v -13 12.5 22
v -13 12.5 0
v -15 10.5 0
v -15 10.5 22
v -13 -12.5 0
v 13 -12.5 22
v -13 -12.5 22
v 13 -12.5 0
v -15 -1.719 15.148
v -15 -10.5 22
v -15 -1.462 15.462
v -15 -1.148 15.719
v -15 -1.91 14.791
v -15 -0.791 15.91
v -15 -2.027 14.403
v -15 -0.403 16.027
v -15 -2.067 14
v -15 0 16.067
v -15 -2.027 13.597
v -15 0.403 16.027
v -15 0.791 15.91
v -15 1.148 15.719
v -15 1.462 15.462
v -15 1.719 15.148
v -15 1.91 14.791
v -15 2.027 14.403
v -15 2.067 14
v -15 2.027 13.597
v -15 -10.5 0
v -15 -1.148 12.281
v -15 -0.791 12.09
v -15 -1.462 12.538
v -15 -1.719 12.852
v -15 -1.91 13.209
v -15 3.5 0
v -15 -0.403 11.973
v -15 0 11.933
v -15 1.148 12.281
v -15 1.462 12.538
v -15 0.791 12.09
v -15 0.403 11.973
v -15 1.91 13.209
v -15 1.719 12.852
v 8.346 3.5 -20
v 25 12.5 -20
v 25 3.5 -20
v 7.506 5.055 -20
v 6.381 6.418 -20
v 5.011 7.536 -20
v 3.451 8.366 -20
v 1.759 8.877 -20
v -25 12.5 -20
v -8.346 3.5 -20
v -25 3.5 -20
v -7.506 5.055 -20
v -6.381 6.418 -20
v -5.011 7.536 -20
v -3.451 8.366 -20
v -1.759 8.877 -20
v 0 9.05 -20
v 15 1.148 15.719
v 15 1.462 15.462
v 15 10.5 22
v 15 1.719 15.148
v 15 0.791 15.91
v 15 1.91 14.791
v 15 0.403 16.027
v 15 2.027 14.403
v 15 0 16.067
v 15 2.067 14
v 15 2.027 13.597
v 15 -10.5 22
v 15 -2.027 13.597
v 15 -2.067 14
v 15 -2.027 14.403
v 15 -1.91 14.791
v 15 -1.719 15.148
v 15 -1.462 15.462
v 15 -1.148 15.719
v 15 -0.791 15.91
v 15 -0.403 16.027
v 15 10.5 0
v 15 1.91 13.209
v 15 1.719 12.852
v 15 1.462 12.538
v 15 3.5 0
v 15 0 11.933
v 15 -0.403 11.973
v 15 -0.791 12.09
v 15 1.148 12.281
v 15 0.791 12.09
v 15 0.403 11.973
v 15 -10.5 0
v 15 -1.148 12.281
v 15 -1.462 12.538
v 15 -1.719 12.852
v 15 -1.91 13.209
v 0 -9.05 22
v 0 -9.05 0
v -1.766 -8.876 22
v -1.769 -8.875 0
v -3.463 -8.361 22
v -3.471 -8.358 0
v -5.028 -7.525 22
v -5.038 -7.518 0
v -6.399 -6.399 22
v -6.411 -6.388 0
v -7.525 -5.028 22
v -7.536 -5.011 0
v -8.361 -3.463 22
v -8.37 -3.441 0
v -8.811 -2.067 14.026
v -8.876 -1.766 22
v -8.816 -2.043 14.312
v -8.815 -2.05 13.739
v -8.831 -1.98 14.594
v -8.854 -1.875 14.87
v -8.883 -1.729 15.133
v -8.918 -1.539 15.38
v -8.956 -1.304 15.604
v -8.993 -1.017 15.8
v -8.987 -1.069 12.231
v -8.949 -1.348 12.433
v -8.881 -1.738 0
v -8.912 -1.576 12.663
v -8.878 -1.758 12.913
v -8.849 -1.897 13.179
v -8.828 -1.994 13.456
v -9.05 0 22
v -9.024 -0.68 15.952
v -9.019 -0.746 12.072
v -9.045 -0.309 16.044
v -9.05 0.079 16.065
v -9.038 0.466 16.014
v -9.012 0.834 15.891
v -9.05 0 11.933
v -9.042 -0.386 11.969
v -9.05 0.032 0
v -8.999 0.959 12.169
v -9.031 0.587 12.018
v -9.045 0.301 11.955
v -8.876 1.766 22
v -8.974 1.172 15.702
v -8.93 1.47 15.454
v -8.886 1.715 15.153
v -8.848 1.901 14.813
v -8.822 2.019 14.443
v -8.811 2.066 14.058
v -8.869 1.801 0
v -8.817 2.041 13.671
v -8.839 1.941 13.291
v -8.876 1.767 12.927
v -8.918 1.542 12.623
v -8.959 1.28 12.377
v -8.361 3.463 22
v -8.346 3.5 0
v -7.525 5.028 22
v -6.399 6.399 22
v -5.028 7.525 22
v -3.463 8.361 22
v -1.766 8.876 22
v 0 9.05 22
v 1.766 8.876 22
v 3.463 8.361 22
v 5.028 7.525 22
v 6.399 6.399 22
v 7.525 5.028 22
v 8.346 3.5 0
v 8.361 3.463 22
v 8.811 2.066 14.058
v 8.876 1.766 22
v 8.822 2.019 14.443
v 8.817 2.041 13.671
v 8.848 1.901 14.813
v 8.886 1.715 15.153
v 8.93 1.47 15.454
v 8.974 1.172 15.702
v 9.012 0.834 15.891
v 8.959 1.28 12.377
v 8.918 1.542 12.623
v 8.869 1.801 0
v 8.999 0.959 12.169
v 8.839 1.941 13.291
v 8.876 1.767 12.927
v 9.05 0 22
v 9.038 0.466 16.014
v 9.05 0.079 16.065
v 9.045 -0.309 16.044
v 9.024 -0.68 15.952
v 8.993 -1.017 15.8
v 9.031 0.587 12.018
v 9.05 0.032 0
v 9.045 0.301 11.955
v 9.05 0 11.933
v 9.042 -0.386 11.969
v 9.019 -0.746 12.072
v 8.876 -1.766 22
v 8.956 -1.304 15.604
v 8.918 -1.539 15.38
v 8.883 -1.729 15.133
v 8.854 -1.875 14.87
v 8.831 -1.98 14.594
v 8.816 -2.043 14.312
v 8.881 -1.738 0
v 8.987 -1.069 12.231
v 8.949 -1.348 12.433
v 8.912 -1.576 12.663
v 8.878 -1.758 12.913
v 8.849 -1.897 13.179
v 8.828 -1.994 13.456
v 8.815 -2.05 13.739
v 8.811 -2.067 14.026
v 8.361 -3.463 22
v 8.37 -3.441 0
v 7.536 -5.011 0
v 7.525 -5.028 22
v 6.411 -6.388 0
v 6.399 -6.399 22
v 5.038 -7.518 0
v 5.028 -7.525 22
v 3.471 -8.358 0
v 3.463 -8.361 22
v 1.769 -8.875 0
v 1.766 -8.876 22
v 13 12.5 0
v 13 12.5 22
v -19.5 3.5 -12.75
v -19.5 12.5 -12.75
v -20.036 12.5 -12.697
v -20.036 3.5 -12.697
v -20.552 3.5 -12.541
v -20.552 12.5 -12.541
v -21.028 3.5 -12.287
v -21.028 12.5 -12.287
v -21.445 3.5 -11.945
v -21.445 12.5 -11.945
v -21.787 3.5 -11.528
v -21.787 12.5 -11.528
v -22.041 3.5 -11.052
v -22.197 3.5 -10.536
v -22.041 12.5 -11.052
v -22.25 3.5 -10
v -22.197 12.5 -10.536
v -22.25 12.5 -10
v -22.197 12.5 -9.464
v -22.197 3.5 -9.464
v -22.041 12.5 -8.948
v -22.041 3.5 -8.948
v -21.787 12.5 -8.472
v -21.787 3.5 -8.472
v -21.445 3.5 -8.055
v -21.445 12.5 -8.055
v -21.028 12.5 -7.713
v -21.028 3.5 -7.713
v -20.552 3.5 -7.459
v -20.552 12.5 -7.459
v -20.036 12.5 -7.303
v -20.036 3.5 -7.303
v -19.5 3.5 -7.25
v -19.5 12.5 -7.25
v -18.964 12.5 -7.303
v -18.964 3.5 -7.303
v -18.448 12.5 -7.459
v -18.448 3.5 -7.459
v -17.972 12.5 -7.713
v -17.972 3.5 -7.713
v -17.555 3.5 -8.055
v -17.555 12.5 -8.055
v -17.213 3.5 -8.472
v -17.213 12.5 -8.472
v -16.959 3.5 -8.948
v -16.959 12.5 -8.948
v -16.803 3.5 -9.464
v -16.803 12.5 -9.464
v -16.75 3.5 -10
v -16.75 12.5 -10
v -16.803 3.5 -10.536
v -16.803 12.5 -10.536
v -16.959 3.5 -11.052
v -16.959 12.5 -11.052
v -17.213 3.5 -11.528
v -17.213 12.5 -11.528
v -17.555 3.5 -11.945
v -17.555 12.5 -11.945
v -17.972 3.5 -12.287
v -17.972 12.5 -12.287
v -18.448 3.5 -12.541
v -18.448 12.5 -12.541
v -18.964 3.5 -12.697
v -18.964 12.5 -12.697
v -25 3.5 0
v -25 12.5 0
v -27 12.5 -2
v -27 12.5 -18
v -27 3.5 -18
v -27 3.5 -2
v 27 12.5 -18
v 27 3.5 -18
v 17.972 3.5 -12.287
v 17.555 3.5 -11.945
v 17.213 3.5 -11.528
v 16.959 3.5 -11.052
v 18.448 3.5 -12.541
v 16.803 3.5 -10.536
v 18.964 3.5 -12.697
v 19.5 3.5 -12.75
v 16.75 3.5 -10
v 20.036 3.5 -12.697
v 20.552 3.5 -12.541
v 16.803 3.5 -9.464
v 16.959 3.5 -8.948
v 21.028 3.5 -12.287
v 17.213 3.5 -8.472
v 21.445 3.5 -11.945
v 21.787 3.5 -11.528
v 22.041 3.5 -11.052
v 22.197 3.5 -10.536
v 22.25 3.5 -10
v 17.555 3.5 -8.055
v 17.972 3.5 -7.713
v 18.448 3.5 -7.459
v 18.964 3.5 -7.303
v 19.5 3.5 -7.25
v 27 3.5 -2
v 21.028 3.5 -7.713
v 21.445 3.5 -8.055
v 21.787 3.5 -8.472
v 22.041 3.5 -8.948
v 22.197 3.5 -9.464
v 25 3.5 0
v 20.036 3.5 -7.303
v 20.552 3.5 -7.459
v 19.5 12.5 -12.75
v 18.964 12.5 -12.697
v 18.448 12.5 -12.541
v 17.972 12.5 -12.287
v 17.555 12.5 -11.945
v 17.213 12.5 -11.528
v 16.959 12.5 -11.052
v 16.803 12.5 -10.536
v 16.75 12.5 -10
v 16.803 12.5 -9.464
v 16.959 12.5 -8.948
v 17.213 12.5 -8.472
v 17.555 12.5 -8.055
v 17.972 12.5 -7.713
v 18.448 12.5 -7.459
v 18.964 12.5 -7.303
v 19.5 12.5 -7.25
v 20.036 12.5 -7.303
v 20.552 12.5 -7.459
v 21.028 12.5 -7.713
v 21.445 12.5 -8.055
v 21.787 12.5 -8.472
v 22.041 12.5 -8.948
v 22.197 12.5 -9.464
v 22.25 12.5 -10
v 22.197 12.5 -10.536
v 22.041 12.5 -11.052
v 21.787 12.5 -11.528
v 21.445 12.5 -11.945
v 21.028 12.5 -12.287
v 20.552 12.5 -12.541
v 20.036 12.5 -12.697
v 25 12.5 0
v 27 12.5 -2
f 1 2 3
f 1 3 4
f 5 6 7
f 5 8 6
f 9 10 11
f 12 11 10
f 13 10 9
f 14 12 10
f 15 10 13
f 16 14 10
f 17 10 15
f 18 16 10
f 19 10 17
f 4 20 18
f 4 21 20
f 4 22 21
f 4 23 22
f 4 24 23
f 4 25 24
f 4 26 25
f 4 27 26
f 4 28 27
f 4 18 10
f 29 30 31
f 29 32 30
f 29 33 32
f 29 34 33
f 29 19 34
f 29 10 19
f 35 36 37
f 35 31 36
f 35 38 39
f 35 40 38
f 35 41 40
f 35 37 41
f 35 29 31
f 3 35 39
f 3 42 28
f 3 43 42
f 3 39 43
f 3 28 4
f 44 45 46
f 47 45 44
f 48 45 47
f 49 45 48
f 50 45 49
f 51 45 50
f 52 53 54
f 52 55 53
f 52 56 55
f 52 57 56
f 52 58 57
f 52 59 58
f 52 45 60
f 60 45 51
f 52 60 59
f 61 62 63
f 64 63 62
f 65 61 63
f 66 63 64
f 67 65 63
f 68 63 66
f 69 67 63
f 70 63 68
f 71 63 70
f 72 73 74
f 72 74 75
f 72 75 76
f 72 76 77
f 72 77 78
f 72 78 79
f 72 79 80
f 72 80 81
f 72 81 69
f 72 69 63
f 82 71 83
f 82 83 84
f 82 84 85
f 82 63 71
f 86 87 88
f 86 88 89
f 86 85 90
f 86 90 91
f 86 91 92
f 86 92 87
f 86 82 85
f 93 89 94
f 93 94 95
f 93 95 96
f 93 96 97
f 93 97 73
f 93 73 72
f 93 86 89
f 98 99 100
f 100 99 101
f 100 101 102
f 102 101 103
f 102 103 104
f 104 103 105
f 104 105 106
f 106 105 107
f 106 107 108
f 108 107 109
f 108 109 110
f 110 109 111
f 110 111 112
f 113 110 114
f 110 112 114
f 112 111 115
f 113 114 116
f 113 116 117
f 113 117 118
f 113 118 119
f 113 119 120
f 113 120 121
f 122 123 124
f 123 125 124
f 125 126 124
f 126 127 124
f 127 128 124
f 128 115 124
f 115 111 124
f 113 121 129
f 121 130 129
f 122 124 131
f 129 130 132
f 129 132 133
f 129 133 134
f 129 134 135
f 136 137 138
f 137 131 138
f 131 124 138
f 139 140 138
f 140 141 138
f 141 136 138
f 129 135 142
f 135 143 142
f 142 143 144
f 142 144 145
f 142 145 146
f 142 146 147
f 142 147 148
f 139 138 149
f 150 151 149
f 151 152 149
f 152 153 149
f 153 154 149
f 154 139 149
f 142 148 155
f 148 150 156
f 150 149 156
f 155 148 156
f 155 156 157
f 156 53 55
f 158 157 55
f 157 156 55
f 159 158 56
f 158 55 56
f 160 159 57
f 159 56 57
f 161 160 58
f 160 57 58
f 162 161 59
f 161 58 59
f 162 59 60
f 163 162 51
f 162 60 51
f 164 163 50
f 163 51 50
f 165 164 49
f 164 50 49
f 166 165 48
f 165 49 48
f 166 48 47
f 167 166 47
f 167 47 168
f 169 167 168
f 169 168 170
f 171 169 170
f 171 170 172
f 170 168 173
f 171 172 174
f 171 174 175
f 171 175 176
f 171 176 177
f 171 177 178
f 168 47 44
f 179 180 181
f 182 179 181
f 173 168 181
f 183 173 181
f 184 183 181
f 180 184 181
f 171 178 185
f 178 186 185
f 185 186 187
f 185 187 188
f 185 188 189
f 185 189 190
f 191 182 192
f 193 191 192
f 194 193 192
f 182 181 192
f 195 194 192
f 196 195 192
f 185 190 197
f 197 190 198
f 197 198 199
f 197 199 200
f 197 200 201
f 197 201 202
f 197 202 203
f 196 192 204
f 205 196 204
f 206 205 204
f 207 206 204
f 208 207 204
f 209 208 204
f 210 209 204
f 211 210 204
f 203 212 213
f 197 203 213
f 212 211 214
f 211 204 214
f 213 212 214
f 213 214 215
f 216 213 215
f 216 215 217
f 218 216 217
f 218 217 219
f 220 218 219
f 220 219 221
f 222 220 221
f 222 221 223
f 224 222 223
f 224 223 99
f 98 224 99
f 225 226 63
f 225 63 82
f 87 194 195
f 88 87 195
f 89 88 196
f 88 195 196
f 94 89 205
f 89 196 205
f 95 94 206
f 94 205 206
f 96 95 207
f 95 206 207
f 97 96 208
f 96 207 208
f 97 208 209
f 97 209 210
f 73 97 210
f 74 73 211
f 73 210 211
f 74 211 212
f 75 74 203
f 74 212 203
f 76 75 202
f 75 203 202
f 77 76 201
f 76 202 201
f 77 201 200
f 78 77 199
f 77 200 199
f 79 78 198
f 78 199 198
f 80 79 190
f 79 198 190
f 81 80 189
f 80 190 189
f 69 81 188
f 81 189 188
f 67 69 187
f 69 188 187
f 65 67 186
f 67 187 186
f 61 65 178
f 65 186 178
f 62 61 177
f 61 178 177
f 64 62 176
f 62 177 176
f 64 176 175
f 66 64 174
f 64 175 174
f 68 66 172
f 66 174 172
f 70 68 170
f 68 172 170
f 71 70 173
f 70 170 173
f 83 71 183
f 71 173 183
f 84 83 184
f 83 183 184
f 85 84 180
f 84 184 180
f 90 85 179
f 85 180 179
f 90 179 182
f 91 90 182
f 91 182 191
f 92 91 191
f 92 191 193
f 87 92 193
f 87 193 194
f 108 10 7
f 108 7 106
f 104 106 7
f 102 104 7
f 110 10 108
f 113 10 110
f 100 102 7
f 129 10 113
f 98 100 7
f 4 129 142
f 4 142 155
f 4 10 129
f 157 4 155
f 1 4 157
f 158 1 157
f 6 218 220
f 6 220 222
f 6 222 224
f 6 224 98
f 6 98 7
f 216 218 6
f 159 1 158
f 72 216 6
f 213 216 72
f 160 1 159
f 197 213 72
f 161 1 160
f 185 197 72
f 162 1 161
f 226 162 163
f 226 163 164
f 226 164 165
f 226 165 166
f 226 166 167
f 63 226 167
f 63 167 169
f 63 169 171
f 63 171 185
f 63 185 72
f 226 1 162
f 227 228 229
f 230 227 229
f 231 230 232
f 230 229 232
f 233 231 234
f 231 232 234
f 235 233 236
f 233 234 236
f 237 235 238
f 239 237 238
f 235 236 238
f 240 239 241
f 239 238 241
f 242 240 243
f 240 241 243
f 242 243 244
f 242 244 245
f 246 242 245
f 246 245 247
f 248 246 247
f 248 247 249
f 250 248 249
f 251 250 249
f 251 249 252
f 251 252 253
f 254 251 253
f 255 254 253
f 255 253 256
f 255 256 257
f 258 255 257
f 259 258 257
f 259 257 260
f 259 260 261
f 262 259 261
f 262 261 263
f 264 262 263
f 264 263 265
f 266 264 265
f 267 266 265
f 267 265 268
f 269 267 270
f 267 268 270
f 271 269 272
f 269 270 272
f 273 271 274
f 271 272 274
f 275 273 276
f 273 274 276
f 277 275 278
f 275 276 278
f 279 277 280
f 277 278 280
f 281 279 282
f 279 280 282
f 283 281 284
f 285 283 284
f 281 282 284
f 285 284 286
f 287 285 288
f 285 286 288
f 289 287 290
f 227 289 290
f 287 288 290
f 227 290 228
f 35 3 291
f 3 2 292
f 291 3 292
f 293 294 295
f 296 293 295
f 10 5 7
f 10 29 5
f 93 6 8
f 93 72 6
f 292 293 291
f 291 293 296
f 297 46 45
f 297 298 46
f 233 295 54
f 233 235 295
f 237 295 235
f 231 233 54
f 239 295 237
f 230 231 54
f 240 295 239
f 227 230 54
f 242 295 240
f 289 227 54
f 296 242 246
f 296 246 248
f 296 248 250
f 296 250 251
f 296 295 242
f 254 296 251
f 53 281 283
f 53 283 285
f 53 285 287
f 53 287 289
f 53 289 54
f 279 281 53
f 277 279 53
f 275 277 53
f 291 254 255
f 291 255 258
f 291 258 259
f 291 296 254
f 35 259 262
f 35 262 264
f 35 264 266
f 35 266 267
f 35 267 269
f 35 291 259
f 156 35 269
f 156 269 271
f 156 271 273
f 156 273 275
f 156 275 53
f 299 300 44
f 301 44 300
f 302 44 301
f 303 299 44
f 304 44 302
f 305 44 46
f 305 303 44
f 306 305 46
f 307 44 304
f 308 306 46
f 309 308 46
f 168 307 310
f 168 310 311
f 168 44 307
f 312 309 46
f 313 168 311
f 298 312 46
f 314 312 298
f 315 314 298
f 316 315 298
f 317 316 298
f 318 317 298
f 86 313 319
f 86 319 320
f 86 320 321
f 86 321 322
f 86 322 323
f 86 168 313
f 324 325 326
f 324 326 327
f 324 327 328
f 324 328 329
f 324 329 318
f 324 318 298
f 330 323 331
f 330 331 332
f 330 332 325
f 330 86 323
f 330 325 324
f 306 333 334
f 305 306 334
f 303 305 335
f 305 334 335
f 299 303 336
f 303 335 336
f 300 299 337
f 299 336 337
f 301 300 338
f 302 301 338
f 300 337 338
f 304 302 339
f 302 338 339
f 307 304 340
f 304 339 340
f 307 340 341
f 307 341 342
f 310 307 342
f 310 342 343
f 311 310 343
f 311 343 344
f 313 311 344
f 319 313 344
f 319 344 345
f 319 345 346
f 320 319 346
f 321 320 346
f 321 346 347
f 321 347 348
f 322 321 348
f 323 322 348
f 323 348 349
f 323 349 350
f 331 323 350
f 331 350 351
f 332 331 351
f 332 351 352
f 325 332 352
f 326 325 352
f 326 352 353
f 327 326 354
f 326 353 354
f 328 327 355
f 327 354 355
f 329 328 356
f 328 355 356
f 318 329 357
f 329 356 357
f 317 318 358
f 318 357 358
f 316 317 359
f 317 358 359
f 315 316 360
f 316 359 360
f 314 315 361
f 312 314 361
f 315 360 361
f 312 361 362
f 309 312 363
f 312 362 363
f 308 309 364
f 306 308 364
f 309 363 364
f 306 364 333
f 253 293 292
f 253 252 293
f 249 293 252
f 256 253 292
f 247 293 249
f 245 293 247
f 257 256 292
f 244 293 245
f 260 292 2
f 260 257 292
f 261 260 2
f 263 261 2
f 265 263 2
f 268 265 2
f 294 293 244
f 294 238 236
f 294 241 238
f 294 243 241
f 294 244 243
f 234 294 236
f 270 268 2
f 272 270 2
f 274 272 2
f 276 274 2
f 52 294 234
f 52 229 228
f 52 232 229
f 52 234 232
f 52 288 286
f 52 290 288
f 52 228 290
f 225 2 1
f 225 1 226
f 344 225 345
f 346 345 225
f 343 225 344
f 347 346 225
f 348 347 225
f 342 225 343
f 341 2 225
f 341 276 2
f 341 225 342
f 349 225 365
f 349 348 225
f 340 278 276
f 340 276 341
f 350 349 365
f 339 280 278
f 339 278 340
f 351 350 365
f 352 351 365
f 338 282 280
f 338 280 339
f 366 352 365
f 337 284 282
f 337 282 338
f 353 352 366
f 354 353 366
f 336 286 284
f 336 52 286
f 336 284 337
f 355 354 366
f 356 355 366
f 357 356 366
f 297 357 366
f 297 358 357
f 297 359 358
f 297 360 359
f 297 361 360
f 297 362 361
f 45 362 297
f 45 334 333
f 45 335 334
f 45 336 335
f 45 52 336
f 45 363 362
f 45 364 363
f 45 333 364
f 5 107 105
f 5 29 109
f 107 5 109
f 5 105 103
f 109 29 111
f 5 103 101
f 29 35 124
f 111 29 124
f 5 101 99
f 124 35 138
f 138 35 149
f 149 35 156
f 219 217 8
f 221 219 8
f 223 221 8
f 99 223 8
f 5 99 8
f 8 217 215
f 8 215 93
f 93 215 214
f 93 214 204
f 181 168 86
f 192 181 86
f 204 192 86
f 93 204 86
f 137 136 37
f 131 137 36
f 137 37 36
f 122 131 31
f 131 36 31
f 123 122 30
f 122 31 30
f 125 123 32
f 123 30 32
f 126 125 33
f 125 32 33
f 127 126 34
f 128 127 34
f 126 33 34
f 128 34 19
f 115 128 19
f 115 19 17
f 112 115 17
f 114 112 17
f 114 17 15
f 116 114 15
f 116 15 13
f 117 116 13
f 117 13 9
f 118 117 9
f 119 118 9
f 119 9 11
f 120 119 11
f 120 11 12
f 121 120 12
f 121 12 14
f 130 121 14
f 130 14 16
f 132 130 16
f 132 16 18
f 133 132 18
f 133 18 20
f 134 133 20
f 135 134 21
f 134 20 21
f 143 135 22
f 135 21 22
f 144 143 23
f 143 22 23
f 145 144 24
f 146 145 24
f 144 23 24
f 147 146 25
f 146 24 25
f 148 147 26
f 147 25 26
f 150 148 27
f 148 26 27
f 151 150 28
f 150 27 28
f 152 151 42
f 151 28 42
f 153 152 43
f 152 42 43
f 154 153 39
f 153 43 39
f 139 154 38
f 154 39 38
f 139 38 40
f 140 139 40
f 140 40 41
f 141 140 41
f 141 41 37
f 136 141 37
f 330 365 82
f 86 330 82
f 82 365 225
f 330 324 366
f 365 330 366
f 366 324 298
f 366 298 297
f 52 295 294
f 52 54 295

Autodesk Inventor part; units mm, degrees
ref_plane "YZ Plane" through (0, 0, 0) normal (1, 0, 0) x (0, 1, 0)
ref_plane "XZ Plane" through (0, 0, 0) normal (0, 1, 0) x (-1, 0, 0)
ref_plane "XY Plane" through (0, 0, 0) normal (0, 0, 1) x (1, 0, 0)
sketch "Sketch7" plane through (0, 0, 0) normal (0, 0, 1) x (1, 0, 0)
  line L0 (15, -12.5) -> (-15, -12.5)
  line L1 (-15, -12.5) -> (-15, 12.5)
  line L2 (-15, 12.5) -> (15, 12.5)
  line L3 (15, 12.5) -> (15, -12.5)
  line L4 (15, -12.5) -> (-15, 12.5) construction
  line L5 (-15, -12.5) -> (15, 12.5) construction
  point P0 (0, 0)
  dimension "d26" = 30
  dimension "d27" = 25
extrude "Extrusion4" add sketch "Sketch7" along normal blind 22
sketch "Sketch8" plane through (0, 0, 0) normal (0, 0, -1) x (-1, 0, 0)
  line L0 (-27, 12.5) -> (27, 12.5)
  line L1 (27, 12.5) -> (27, 3.5)
  line L2 (27, 3.5) -> (-27, 3.5)
  line L3 (-27, 3.5) -> (-27, 12.5)
  line L4 (-15, -12.5) -> (-15, 12.5) projected
  line L5 (15, 12.5) -> (15, -12.5) projected
  line L6 (-15, 12.5) -> (15, 12.5) projected
  point P0 (0, 0)
  dimension "d30" = 12
  dimension "d31" = 12
  dimension "d32" = 9
extrude "Extrusion5" add sketch "Sketch8" along normal blind 20
sketch "Sketch9" plane through (0, 0, 22) normal (0, 0, 1) x (1, 0, 0)
  line L0 (15, 12.5) -> (-15, 12.5) projected
  line L1 (15, -12.5) -> (15, 12.5) projected
  point P0 (0, 0)
  point P1 (0, 0)
  point P2 (0, 12.5)
  point P3 (15, 0)
hole "Hole3" at (0, 0, 22) direction (0, 0, -1) diameter 18.1 end through all
sketch "Sketch10" plane through (15, 3.5, 0) normal (0, -1, 0) x (1, 0, 0)
  line L0 (12, 0) -> (0, 0) projected
  line L1 (12, -20) -> (-6.6542, -20) projected
  line L2 (12, 0) -> (12, -20) projected
  line L3 (-42, 0) -> (-42, -20) projected
  point P0 (-15, 0)
  point P1 (4.5, -10)
  point P2 (-34.5, -10)
  dimension "d42" = 20
  dimension "d43" = 10
  dimension "d44" = 7.5
  dimension "d45" = 7.5
hole "Hole4" at (19.5, 3.5, -10) at (-19.5, 3.5, -10) direction (0, 1, 0) diameter 5.5 end through all clearance for "Socket Head Cap Screw" size "M5" standard "TS Profile"
chamfer "Chamfer1" distance 2 angle 45 8 edges at (15, 12.5, 11) (15, -12.5, 11) (-15, -12.5, 11) (-15, 12.5, 11) (27, 8, 0) (27, 8, -20) (-27, 8, -20) (-27, 8, 0)
sketch "Sketch11" plane through (15, -10.5, 0) normal (1, 0, 0) x (0, 0, -1)
  line L0 (-22, 0) -> (-22, 21) projected
  point P0 (0, 10.5)
  point P1 (-14, 10.5)
  dimension "d63" = 8
hole "Hole5" at (15, 0, 14) direction (-1, 0, 0) diameter 4.134 end through all thread size "M5x0.8" class "6H" standard "TS profile"
equation "\"d31\" = d30"
equation "\"d43\" = 0.5 * d42"
equation "\"d45\" = d44"
properties part number "TL20240901-10320CV-026" material "MC NYLON"
